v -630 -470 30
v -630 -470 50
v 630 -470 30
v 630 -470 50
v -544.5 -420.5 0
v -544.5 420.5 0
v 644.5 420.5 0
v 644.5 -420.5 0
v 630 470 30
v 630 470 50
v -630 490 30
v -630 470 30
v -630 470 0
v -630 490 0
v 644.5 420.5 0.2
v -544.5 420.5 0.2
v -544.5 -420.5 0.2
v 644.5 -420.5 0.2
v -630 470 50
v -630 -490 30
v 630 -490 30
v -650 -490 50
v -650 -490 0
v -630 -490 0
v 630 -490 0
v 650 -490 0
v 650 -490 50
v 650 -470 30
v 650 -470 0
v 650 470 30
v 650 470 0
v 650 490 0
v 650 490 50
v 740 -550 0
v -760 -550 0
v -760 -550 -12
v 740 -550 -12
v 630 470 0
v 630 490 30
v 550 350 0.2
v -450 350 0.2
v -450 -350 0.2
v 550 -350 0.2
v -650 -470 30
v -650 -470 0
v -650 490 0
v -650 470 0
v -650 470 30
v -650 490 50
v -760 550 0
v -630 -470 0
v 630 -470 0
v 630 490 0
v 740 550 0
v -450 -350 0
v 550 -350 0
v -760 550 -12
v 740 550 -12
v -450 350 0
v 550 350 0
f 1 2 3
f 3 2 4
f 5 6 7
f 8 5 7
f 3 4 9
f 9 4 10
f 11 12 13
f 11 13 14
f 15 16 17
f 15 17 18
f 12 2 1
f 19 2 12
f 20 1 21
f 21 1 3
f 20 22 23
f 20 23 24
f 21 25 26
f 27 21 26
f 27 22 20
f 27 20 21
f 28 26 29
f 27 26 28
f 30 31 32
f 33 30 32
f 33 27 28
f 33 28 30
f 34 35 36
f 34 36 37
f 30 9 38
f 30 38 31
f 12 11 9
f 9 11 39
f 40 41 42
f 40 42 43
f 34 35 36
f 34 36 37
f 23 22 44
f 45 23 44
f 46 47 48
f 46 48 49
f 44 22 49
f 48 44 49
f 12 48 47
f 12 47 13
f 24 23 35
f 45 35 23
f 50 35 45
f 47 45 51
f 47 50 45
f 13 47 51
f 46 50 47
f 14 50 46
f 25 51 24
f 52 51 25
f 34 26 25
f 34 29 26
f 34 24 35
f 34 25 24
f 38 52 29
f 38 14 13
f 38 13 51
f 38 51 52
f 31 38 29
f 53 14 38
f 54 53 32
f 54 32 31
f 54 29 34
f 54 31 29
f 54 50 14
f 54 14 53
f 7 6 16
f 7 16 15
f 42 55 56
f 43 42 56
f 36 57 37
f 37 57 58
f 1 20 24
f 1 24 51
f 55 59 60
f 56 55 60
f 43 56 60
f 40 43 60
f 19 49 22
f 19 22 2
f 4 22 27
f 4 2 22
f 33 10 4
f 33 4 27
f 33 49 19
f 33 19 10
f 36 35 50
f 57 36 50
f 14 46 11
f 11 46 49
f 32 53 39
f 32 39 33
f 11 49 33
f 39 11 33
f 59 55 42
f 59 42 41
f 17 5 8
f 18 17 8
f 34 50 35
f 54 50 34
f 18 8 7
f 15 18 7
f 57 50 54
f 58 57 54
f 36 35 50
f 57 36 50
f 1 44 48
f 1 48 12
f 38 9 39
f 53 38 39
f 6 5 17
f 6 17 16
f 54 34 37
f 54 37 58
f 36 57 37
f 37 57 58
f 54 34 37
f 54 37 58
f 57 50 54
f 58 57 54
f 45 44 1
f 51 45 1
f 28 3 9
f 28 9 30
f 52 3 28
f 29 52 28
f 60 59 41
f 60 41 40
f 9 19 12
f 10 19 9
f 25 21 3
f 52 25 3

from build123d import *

# Parameters (mm, degrees)
F1_W      = 1500
F1_H      = 1100
F3_DEPTH  = 12
F5_W      = 1300
F5_H      = 980
F5_W_2    = 1260
F5_H_2    = 940
F6_DEPTH  = 10
F7_W      = 20
F7_H      = 20
F8_DEPTH  = 50
F9_DEPTH  = 12
F10_W     = 1189
F10_H     = 841
F11_DEPTH = 0.2
F12_W     = 1000
F12_H     = 700
F13_DEPTH = 0.2


with BuildPart() as f3:
    # F1 (on Top) → F3 (new body)
    with BuildSketch(Plane.XY):
        with Locations((-10, 0)):
            Rectangle(F1_W, F1_H)
    extrude(amount=-F3_DEPTH)



with BuildPart() as f6:
    # F5 (on offset) → F6 (new body, symmetric)
    with BuildSketch(Plane.XY.offset(40)):
        Rectangle(F5_W, F5_H)
        Rectangle(F5_W_2, F5_H_2, mode=Mode.SUBTRACT)
    extrude(amount=F6_DEPTH, both=True)


with BuildPart() as f3_1:
    add(f3.part)

    add(f6.part)  # F8 merges F6
    # F7 (on face) → F8 (join, through all)
    with BuildSketch(Plane.XY.offset(50)):
        with Locations((-640, 480)):
            Rectangle(F7_W, F7_H)
        with Locations((640, 480)):
            Rectangle(F7_W, F7_H)
        with Locations((640, -480)):
            Rectangle(F7_W, F7_H)
        with Locations((-640, -480)):
            Rectangle(F7_W, F7_H)
    extrude(amount=-F8_DEPTH)


with BuildPart() as f9:
    # F1 (on Top) → F9 (new body)
    with BuildSketch(Plane.XY):
        with Locations((-10, 0)):
            Rectangle(F1_W, F1_H)
    extrude(amount=-F9_DEPTH)


with BuildPart() as f11:
    # F10 (on face) → F11 (new body)
    with BuildSketch(Plane.XY):
        with Locations((50, 0)):
            Rectangle(F10_W, F10_H)
    extrude(amount=F11_DEPTH)


with BuildPart() as f13:
    # F12 (on face) → F13 (new body)
    with BuildSketch(Plane.XY):
        with Locations((50, 0)):
            Rectangle(F12_W, F12_H)
    extrude(amount=F13_DEPTH)


solid = Compound([f3_1.part, f9.part, f11.part, f13.part])
